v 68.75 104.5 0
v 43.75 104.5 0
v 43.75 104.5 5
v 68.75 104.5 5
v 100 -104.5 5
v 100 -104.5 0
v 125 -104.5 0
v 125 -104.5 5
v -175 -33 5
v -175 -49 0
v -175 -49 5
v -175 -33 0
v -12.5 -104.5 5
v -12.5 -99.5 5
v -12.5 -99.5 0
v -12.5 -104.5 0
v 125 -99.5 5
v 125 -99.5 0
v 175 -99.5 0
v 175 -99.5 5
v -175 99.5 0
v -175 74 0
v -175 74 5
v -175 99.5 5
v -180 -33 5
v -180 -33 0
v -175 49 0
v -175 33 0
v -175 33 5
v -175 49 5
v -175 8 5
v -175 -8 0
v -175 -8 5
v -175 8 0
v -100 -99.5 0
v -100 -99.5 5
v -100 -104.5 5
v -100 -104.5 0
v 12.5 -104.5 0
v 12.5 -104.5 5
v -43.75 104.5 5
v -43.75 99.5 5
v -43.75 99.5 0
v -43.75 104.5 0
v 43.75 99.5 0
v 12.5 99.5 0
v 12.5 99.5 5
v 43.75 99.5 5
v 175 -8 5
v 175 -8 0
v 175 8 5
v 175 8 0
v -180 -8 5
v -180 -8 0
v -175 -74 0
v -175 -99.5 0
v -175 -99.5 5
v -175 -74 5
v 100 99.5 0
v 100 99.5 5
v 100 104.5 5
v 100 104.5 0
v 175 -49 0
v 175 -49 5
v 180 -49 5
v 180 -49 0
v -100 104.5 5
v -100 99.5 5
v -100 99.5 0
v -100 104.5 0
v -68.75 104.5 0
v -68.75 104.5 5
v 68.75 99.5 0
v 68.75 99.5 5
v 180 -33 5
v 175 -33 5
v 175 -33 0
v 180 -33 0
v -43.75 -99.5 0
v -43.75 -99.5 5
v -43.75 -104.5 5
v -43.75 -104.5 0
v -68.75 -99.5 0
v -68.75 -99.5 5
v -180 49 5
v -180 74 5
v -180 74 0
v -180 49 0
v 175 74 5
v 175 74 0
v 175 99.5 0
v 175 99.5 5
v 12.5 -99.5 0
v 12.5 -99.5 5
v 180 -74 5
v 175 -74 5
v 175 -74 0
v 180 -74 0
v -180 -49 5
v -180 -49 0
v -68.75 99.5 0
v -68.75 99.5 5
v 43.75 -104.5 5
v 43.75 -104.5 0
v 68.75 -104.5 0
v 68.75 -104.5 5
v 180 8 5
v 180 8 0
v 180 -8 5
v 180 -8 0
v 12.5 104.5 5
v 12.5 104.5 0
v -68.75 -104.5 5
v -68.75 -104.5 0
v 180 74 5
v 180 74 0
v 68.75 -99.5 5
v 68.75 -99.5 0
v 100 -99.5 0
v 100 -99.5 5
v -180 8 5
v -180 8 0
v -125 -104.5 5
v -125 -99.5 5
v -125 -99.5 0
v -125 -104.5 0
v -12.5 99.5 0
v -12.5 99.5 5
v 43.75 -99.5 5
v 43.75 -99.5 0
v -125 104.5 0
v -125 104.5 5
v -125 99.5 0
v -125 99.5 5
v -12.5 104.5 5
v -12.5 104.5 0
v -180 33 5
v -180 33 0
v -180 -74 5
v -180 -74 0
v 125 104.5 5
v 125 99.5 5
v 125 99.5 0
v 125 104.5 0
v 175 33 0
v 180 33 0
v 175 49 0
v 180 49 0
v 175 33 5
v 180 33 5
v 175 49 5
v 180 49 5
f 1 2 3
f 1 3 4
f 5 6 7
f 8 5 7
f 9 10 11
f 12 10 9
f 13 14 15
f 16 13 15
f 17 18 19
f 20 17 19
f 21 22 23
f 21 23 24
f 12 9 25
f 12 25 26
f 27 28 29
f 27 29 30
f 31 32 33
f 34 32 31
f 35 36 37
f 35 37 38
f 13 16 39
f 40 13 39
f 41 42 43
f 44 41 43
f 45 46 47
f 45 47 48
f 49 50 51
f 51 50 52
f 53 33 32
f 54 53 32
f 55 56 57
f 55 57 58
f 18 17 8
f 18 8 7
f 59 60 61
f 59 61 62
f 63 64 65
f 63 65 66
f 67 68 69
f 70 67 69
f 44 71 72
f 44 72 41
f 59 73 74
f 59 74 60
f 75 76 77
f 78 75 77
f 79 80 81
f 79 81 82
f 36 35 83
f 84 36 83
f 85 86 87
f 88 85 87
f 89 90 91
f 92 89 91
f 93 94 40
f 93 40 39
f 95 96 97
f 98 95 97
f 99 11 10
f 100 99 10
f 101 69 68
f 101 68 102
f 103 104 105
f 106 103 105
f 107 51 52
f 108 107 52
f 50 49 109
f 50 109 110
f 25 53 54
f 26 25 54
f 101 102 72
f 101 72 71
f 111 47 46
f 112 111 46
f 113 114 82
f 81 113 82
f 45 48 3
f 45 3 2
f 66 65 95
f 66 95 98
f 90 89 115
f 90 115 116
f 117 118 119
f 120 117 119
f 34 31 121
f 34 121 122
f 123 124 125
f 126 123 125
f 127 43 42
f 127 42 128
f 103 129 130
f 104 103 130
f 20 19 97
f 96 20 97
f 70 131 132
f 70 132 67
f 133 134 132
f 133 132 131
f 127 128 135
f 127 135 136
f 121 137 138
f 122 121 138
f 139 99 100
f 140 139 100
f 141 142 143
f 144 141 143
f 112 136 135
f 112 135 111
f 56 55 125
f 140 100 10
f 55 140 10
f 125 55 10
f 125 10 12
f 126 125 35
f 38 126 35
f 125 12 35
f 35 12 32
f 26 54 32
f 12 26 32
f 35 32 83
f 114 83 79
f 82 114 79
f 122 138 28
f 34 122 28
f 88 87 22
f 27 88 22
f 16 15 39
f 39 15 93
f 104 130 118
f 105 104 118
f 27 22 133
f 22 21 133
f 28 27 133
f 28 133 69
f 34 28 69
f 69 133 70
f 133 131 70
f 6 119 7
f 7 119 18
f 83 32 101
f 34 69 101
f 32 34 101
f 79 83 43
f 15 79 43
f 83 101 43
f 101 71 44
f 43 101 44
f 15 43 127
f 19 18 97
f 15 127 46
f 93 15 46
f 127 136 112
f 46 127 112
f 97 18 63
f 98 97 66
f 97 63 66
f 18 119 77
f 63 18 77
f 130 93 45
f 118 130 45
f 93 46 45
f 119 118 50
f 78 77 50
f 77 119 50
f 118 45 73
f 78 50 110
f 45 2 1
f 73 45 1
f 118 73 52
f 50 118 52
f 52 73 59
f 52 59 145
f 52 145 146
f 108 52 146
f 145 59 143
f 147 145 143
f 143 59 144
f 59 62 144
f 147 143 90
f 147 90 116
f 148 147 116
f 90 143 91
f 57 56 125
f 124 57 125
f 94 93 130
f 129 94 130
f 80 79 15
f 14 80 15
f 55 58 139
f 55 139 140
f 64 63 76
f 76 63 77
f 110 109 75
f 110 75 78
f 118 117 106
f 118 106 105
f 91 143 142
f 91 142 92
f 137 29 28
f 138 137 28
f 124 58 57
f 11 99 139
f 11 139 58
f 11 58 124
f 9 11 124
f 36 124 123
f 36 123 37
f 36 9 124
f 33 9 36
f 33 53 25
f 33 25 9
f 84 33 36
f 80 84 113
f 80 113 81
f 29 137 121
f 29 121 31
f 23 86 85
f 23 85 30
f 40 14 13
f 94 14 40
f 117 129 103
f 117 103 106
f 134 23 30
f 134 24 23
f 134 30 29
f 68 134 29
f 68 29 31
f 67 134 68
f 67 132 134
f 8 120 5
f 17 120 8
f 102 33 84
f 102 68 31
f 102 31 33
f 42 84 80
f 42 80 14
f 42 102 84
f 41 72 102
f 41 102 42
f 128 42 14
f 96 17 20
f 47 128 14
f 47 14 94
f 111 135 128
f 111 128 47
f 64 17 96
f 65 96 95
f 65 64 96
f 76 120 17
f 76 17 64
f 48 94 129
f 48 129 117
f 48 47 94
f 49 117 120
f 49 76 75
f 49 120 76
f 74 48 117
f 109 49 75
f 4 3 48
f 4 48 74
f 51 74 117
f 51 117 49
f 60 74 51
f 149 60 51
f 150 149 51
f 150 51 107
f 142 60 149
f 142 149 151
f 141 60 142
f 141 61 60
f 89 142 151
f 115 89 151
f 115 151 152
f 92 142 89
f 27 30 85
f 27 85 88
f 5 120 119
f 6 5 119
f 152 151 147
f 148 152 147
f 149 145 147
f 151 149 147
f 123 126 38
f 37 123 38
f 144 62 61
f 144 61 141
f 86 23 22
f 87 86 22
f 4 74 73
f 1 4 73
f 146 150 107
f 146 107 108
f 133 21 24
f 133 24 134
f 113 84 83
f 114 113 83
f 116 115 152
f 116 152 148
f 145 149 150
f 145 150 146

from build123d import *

# Parameters (mm, degrees)
SKETCH1_W           = 350
SKETCH1_H           = 199
BOSS_EXTRUDE1_DEPTH = 5
SKETCH2_W           = 5
SKETCH2_H           = 25
BOSS_EXTRUDE2_DEPTH = 5
SKETCH3_W           = 25
SKETCH3_H           = 5
BOSS_EXTRUDE3_DEPTH = 5


with BuildPart() as part:
    # Sketch1 → Boss-Extrude1 (new body)
    with BuildSketch(Plane.XY):
        Rectangle(SKETCH1_W, SKETCH1_H)
    extrude(amount=BOSS_EXTRUDE1_DEPTH)

    # Sketch2 → Boss-Extrude2 (add)
    with BuildSketch(Plane(origin=(175, 0, 0), x_dir=(0, 0, -1), z_dir=(1, 0, 0))):
        with Locations((-2.5, 61.5)):
            Rectangle(SKETCH2_W, SKETCH2_H)
        with Locations((-2.5, 20.5)):
            Rectangle(SKETCH2_W, SKETCH2_H)
        with Locations((-2.5, -20.5)):
            Rectangle(SKETCH2_W, SKETCH2_H)
        with Locations((-2.5, -61.5)):
            Rectangle(SKETCH2_W, SKETCH2_H)
    boss_extrude2 = extrude(amount=BOSS_EXTRUDE2_DEPTH)

    # Mirror1: Boss-Extrude2 across plane
    add(boss_extrude2.mirror(Plane(origin=(0, 0, 0), x_dir=(0, 0, 1), z_dir=(1, 0, 0))))

    # Sketch3 → Boss-Extrude3 (add)
    with BuildSketch(Plane(origin=(0, 99.5, 0), x_dir=(1, 0, 0), z_dir=(0, 1, 0))):
        with Locations((-112.5, -2.5)):
            Rectangle(SKETCH3_W, SKETCH3_H)
        with Locations((-56.25, -2.5)):
            Rectangle(SKETCH3_W, SKETCH3_H)
        with Locations((0, -2.5)):
            Rectangle(SKETCH3_W, SKETCH3_H)
        with Locations((56.25, -2.5)):
            Rectangle(SKETCH3_W, SKETCH3_H)
        with Locations((112.5, -2.5)):
            Rectangle(SKETCH3_W, SKETCH3_H)
    boss_extrude3 = extrude(amount=BOSS_EXTRUDE3_DEPTH)

    # Mirror2: Boss-Extrude3 across plane
    add(boss_extrude3.mirror(Plane.ZX))


solid = part.part
